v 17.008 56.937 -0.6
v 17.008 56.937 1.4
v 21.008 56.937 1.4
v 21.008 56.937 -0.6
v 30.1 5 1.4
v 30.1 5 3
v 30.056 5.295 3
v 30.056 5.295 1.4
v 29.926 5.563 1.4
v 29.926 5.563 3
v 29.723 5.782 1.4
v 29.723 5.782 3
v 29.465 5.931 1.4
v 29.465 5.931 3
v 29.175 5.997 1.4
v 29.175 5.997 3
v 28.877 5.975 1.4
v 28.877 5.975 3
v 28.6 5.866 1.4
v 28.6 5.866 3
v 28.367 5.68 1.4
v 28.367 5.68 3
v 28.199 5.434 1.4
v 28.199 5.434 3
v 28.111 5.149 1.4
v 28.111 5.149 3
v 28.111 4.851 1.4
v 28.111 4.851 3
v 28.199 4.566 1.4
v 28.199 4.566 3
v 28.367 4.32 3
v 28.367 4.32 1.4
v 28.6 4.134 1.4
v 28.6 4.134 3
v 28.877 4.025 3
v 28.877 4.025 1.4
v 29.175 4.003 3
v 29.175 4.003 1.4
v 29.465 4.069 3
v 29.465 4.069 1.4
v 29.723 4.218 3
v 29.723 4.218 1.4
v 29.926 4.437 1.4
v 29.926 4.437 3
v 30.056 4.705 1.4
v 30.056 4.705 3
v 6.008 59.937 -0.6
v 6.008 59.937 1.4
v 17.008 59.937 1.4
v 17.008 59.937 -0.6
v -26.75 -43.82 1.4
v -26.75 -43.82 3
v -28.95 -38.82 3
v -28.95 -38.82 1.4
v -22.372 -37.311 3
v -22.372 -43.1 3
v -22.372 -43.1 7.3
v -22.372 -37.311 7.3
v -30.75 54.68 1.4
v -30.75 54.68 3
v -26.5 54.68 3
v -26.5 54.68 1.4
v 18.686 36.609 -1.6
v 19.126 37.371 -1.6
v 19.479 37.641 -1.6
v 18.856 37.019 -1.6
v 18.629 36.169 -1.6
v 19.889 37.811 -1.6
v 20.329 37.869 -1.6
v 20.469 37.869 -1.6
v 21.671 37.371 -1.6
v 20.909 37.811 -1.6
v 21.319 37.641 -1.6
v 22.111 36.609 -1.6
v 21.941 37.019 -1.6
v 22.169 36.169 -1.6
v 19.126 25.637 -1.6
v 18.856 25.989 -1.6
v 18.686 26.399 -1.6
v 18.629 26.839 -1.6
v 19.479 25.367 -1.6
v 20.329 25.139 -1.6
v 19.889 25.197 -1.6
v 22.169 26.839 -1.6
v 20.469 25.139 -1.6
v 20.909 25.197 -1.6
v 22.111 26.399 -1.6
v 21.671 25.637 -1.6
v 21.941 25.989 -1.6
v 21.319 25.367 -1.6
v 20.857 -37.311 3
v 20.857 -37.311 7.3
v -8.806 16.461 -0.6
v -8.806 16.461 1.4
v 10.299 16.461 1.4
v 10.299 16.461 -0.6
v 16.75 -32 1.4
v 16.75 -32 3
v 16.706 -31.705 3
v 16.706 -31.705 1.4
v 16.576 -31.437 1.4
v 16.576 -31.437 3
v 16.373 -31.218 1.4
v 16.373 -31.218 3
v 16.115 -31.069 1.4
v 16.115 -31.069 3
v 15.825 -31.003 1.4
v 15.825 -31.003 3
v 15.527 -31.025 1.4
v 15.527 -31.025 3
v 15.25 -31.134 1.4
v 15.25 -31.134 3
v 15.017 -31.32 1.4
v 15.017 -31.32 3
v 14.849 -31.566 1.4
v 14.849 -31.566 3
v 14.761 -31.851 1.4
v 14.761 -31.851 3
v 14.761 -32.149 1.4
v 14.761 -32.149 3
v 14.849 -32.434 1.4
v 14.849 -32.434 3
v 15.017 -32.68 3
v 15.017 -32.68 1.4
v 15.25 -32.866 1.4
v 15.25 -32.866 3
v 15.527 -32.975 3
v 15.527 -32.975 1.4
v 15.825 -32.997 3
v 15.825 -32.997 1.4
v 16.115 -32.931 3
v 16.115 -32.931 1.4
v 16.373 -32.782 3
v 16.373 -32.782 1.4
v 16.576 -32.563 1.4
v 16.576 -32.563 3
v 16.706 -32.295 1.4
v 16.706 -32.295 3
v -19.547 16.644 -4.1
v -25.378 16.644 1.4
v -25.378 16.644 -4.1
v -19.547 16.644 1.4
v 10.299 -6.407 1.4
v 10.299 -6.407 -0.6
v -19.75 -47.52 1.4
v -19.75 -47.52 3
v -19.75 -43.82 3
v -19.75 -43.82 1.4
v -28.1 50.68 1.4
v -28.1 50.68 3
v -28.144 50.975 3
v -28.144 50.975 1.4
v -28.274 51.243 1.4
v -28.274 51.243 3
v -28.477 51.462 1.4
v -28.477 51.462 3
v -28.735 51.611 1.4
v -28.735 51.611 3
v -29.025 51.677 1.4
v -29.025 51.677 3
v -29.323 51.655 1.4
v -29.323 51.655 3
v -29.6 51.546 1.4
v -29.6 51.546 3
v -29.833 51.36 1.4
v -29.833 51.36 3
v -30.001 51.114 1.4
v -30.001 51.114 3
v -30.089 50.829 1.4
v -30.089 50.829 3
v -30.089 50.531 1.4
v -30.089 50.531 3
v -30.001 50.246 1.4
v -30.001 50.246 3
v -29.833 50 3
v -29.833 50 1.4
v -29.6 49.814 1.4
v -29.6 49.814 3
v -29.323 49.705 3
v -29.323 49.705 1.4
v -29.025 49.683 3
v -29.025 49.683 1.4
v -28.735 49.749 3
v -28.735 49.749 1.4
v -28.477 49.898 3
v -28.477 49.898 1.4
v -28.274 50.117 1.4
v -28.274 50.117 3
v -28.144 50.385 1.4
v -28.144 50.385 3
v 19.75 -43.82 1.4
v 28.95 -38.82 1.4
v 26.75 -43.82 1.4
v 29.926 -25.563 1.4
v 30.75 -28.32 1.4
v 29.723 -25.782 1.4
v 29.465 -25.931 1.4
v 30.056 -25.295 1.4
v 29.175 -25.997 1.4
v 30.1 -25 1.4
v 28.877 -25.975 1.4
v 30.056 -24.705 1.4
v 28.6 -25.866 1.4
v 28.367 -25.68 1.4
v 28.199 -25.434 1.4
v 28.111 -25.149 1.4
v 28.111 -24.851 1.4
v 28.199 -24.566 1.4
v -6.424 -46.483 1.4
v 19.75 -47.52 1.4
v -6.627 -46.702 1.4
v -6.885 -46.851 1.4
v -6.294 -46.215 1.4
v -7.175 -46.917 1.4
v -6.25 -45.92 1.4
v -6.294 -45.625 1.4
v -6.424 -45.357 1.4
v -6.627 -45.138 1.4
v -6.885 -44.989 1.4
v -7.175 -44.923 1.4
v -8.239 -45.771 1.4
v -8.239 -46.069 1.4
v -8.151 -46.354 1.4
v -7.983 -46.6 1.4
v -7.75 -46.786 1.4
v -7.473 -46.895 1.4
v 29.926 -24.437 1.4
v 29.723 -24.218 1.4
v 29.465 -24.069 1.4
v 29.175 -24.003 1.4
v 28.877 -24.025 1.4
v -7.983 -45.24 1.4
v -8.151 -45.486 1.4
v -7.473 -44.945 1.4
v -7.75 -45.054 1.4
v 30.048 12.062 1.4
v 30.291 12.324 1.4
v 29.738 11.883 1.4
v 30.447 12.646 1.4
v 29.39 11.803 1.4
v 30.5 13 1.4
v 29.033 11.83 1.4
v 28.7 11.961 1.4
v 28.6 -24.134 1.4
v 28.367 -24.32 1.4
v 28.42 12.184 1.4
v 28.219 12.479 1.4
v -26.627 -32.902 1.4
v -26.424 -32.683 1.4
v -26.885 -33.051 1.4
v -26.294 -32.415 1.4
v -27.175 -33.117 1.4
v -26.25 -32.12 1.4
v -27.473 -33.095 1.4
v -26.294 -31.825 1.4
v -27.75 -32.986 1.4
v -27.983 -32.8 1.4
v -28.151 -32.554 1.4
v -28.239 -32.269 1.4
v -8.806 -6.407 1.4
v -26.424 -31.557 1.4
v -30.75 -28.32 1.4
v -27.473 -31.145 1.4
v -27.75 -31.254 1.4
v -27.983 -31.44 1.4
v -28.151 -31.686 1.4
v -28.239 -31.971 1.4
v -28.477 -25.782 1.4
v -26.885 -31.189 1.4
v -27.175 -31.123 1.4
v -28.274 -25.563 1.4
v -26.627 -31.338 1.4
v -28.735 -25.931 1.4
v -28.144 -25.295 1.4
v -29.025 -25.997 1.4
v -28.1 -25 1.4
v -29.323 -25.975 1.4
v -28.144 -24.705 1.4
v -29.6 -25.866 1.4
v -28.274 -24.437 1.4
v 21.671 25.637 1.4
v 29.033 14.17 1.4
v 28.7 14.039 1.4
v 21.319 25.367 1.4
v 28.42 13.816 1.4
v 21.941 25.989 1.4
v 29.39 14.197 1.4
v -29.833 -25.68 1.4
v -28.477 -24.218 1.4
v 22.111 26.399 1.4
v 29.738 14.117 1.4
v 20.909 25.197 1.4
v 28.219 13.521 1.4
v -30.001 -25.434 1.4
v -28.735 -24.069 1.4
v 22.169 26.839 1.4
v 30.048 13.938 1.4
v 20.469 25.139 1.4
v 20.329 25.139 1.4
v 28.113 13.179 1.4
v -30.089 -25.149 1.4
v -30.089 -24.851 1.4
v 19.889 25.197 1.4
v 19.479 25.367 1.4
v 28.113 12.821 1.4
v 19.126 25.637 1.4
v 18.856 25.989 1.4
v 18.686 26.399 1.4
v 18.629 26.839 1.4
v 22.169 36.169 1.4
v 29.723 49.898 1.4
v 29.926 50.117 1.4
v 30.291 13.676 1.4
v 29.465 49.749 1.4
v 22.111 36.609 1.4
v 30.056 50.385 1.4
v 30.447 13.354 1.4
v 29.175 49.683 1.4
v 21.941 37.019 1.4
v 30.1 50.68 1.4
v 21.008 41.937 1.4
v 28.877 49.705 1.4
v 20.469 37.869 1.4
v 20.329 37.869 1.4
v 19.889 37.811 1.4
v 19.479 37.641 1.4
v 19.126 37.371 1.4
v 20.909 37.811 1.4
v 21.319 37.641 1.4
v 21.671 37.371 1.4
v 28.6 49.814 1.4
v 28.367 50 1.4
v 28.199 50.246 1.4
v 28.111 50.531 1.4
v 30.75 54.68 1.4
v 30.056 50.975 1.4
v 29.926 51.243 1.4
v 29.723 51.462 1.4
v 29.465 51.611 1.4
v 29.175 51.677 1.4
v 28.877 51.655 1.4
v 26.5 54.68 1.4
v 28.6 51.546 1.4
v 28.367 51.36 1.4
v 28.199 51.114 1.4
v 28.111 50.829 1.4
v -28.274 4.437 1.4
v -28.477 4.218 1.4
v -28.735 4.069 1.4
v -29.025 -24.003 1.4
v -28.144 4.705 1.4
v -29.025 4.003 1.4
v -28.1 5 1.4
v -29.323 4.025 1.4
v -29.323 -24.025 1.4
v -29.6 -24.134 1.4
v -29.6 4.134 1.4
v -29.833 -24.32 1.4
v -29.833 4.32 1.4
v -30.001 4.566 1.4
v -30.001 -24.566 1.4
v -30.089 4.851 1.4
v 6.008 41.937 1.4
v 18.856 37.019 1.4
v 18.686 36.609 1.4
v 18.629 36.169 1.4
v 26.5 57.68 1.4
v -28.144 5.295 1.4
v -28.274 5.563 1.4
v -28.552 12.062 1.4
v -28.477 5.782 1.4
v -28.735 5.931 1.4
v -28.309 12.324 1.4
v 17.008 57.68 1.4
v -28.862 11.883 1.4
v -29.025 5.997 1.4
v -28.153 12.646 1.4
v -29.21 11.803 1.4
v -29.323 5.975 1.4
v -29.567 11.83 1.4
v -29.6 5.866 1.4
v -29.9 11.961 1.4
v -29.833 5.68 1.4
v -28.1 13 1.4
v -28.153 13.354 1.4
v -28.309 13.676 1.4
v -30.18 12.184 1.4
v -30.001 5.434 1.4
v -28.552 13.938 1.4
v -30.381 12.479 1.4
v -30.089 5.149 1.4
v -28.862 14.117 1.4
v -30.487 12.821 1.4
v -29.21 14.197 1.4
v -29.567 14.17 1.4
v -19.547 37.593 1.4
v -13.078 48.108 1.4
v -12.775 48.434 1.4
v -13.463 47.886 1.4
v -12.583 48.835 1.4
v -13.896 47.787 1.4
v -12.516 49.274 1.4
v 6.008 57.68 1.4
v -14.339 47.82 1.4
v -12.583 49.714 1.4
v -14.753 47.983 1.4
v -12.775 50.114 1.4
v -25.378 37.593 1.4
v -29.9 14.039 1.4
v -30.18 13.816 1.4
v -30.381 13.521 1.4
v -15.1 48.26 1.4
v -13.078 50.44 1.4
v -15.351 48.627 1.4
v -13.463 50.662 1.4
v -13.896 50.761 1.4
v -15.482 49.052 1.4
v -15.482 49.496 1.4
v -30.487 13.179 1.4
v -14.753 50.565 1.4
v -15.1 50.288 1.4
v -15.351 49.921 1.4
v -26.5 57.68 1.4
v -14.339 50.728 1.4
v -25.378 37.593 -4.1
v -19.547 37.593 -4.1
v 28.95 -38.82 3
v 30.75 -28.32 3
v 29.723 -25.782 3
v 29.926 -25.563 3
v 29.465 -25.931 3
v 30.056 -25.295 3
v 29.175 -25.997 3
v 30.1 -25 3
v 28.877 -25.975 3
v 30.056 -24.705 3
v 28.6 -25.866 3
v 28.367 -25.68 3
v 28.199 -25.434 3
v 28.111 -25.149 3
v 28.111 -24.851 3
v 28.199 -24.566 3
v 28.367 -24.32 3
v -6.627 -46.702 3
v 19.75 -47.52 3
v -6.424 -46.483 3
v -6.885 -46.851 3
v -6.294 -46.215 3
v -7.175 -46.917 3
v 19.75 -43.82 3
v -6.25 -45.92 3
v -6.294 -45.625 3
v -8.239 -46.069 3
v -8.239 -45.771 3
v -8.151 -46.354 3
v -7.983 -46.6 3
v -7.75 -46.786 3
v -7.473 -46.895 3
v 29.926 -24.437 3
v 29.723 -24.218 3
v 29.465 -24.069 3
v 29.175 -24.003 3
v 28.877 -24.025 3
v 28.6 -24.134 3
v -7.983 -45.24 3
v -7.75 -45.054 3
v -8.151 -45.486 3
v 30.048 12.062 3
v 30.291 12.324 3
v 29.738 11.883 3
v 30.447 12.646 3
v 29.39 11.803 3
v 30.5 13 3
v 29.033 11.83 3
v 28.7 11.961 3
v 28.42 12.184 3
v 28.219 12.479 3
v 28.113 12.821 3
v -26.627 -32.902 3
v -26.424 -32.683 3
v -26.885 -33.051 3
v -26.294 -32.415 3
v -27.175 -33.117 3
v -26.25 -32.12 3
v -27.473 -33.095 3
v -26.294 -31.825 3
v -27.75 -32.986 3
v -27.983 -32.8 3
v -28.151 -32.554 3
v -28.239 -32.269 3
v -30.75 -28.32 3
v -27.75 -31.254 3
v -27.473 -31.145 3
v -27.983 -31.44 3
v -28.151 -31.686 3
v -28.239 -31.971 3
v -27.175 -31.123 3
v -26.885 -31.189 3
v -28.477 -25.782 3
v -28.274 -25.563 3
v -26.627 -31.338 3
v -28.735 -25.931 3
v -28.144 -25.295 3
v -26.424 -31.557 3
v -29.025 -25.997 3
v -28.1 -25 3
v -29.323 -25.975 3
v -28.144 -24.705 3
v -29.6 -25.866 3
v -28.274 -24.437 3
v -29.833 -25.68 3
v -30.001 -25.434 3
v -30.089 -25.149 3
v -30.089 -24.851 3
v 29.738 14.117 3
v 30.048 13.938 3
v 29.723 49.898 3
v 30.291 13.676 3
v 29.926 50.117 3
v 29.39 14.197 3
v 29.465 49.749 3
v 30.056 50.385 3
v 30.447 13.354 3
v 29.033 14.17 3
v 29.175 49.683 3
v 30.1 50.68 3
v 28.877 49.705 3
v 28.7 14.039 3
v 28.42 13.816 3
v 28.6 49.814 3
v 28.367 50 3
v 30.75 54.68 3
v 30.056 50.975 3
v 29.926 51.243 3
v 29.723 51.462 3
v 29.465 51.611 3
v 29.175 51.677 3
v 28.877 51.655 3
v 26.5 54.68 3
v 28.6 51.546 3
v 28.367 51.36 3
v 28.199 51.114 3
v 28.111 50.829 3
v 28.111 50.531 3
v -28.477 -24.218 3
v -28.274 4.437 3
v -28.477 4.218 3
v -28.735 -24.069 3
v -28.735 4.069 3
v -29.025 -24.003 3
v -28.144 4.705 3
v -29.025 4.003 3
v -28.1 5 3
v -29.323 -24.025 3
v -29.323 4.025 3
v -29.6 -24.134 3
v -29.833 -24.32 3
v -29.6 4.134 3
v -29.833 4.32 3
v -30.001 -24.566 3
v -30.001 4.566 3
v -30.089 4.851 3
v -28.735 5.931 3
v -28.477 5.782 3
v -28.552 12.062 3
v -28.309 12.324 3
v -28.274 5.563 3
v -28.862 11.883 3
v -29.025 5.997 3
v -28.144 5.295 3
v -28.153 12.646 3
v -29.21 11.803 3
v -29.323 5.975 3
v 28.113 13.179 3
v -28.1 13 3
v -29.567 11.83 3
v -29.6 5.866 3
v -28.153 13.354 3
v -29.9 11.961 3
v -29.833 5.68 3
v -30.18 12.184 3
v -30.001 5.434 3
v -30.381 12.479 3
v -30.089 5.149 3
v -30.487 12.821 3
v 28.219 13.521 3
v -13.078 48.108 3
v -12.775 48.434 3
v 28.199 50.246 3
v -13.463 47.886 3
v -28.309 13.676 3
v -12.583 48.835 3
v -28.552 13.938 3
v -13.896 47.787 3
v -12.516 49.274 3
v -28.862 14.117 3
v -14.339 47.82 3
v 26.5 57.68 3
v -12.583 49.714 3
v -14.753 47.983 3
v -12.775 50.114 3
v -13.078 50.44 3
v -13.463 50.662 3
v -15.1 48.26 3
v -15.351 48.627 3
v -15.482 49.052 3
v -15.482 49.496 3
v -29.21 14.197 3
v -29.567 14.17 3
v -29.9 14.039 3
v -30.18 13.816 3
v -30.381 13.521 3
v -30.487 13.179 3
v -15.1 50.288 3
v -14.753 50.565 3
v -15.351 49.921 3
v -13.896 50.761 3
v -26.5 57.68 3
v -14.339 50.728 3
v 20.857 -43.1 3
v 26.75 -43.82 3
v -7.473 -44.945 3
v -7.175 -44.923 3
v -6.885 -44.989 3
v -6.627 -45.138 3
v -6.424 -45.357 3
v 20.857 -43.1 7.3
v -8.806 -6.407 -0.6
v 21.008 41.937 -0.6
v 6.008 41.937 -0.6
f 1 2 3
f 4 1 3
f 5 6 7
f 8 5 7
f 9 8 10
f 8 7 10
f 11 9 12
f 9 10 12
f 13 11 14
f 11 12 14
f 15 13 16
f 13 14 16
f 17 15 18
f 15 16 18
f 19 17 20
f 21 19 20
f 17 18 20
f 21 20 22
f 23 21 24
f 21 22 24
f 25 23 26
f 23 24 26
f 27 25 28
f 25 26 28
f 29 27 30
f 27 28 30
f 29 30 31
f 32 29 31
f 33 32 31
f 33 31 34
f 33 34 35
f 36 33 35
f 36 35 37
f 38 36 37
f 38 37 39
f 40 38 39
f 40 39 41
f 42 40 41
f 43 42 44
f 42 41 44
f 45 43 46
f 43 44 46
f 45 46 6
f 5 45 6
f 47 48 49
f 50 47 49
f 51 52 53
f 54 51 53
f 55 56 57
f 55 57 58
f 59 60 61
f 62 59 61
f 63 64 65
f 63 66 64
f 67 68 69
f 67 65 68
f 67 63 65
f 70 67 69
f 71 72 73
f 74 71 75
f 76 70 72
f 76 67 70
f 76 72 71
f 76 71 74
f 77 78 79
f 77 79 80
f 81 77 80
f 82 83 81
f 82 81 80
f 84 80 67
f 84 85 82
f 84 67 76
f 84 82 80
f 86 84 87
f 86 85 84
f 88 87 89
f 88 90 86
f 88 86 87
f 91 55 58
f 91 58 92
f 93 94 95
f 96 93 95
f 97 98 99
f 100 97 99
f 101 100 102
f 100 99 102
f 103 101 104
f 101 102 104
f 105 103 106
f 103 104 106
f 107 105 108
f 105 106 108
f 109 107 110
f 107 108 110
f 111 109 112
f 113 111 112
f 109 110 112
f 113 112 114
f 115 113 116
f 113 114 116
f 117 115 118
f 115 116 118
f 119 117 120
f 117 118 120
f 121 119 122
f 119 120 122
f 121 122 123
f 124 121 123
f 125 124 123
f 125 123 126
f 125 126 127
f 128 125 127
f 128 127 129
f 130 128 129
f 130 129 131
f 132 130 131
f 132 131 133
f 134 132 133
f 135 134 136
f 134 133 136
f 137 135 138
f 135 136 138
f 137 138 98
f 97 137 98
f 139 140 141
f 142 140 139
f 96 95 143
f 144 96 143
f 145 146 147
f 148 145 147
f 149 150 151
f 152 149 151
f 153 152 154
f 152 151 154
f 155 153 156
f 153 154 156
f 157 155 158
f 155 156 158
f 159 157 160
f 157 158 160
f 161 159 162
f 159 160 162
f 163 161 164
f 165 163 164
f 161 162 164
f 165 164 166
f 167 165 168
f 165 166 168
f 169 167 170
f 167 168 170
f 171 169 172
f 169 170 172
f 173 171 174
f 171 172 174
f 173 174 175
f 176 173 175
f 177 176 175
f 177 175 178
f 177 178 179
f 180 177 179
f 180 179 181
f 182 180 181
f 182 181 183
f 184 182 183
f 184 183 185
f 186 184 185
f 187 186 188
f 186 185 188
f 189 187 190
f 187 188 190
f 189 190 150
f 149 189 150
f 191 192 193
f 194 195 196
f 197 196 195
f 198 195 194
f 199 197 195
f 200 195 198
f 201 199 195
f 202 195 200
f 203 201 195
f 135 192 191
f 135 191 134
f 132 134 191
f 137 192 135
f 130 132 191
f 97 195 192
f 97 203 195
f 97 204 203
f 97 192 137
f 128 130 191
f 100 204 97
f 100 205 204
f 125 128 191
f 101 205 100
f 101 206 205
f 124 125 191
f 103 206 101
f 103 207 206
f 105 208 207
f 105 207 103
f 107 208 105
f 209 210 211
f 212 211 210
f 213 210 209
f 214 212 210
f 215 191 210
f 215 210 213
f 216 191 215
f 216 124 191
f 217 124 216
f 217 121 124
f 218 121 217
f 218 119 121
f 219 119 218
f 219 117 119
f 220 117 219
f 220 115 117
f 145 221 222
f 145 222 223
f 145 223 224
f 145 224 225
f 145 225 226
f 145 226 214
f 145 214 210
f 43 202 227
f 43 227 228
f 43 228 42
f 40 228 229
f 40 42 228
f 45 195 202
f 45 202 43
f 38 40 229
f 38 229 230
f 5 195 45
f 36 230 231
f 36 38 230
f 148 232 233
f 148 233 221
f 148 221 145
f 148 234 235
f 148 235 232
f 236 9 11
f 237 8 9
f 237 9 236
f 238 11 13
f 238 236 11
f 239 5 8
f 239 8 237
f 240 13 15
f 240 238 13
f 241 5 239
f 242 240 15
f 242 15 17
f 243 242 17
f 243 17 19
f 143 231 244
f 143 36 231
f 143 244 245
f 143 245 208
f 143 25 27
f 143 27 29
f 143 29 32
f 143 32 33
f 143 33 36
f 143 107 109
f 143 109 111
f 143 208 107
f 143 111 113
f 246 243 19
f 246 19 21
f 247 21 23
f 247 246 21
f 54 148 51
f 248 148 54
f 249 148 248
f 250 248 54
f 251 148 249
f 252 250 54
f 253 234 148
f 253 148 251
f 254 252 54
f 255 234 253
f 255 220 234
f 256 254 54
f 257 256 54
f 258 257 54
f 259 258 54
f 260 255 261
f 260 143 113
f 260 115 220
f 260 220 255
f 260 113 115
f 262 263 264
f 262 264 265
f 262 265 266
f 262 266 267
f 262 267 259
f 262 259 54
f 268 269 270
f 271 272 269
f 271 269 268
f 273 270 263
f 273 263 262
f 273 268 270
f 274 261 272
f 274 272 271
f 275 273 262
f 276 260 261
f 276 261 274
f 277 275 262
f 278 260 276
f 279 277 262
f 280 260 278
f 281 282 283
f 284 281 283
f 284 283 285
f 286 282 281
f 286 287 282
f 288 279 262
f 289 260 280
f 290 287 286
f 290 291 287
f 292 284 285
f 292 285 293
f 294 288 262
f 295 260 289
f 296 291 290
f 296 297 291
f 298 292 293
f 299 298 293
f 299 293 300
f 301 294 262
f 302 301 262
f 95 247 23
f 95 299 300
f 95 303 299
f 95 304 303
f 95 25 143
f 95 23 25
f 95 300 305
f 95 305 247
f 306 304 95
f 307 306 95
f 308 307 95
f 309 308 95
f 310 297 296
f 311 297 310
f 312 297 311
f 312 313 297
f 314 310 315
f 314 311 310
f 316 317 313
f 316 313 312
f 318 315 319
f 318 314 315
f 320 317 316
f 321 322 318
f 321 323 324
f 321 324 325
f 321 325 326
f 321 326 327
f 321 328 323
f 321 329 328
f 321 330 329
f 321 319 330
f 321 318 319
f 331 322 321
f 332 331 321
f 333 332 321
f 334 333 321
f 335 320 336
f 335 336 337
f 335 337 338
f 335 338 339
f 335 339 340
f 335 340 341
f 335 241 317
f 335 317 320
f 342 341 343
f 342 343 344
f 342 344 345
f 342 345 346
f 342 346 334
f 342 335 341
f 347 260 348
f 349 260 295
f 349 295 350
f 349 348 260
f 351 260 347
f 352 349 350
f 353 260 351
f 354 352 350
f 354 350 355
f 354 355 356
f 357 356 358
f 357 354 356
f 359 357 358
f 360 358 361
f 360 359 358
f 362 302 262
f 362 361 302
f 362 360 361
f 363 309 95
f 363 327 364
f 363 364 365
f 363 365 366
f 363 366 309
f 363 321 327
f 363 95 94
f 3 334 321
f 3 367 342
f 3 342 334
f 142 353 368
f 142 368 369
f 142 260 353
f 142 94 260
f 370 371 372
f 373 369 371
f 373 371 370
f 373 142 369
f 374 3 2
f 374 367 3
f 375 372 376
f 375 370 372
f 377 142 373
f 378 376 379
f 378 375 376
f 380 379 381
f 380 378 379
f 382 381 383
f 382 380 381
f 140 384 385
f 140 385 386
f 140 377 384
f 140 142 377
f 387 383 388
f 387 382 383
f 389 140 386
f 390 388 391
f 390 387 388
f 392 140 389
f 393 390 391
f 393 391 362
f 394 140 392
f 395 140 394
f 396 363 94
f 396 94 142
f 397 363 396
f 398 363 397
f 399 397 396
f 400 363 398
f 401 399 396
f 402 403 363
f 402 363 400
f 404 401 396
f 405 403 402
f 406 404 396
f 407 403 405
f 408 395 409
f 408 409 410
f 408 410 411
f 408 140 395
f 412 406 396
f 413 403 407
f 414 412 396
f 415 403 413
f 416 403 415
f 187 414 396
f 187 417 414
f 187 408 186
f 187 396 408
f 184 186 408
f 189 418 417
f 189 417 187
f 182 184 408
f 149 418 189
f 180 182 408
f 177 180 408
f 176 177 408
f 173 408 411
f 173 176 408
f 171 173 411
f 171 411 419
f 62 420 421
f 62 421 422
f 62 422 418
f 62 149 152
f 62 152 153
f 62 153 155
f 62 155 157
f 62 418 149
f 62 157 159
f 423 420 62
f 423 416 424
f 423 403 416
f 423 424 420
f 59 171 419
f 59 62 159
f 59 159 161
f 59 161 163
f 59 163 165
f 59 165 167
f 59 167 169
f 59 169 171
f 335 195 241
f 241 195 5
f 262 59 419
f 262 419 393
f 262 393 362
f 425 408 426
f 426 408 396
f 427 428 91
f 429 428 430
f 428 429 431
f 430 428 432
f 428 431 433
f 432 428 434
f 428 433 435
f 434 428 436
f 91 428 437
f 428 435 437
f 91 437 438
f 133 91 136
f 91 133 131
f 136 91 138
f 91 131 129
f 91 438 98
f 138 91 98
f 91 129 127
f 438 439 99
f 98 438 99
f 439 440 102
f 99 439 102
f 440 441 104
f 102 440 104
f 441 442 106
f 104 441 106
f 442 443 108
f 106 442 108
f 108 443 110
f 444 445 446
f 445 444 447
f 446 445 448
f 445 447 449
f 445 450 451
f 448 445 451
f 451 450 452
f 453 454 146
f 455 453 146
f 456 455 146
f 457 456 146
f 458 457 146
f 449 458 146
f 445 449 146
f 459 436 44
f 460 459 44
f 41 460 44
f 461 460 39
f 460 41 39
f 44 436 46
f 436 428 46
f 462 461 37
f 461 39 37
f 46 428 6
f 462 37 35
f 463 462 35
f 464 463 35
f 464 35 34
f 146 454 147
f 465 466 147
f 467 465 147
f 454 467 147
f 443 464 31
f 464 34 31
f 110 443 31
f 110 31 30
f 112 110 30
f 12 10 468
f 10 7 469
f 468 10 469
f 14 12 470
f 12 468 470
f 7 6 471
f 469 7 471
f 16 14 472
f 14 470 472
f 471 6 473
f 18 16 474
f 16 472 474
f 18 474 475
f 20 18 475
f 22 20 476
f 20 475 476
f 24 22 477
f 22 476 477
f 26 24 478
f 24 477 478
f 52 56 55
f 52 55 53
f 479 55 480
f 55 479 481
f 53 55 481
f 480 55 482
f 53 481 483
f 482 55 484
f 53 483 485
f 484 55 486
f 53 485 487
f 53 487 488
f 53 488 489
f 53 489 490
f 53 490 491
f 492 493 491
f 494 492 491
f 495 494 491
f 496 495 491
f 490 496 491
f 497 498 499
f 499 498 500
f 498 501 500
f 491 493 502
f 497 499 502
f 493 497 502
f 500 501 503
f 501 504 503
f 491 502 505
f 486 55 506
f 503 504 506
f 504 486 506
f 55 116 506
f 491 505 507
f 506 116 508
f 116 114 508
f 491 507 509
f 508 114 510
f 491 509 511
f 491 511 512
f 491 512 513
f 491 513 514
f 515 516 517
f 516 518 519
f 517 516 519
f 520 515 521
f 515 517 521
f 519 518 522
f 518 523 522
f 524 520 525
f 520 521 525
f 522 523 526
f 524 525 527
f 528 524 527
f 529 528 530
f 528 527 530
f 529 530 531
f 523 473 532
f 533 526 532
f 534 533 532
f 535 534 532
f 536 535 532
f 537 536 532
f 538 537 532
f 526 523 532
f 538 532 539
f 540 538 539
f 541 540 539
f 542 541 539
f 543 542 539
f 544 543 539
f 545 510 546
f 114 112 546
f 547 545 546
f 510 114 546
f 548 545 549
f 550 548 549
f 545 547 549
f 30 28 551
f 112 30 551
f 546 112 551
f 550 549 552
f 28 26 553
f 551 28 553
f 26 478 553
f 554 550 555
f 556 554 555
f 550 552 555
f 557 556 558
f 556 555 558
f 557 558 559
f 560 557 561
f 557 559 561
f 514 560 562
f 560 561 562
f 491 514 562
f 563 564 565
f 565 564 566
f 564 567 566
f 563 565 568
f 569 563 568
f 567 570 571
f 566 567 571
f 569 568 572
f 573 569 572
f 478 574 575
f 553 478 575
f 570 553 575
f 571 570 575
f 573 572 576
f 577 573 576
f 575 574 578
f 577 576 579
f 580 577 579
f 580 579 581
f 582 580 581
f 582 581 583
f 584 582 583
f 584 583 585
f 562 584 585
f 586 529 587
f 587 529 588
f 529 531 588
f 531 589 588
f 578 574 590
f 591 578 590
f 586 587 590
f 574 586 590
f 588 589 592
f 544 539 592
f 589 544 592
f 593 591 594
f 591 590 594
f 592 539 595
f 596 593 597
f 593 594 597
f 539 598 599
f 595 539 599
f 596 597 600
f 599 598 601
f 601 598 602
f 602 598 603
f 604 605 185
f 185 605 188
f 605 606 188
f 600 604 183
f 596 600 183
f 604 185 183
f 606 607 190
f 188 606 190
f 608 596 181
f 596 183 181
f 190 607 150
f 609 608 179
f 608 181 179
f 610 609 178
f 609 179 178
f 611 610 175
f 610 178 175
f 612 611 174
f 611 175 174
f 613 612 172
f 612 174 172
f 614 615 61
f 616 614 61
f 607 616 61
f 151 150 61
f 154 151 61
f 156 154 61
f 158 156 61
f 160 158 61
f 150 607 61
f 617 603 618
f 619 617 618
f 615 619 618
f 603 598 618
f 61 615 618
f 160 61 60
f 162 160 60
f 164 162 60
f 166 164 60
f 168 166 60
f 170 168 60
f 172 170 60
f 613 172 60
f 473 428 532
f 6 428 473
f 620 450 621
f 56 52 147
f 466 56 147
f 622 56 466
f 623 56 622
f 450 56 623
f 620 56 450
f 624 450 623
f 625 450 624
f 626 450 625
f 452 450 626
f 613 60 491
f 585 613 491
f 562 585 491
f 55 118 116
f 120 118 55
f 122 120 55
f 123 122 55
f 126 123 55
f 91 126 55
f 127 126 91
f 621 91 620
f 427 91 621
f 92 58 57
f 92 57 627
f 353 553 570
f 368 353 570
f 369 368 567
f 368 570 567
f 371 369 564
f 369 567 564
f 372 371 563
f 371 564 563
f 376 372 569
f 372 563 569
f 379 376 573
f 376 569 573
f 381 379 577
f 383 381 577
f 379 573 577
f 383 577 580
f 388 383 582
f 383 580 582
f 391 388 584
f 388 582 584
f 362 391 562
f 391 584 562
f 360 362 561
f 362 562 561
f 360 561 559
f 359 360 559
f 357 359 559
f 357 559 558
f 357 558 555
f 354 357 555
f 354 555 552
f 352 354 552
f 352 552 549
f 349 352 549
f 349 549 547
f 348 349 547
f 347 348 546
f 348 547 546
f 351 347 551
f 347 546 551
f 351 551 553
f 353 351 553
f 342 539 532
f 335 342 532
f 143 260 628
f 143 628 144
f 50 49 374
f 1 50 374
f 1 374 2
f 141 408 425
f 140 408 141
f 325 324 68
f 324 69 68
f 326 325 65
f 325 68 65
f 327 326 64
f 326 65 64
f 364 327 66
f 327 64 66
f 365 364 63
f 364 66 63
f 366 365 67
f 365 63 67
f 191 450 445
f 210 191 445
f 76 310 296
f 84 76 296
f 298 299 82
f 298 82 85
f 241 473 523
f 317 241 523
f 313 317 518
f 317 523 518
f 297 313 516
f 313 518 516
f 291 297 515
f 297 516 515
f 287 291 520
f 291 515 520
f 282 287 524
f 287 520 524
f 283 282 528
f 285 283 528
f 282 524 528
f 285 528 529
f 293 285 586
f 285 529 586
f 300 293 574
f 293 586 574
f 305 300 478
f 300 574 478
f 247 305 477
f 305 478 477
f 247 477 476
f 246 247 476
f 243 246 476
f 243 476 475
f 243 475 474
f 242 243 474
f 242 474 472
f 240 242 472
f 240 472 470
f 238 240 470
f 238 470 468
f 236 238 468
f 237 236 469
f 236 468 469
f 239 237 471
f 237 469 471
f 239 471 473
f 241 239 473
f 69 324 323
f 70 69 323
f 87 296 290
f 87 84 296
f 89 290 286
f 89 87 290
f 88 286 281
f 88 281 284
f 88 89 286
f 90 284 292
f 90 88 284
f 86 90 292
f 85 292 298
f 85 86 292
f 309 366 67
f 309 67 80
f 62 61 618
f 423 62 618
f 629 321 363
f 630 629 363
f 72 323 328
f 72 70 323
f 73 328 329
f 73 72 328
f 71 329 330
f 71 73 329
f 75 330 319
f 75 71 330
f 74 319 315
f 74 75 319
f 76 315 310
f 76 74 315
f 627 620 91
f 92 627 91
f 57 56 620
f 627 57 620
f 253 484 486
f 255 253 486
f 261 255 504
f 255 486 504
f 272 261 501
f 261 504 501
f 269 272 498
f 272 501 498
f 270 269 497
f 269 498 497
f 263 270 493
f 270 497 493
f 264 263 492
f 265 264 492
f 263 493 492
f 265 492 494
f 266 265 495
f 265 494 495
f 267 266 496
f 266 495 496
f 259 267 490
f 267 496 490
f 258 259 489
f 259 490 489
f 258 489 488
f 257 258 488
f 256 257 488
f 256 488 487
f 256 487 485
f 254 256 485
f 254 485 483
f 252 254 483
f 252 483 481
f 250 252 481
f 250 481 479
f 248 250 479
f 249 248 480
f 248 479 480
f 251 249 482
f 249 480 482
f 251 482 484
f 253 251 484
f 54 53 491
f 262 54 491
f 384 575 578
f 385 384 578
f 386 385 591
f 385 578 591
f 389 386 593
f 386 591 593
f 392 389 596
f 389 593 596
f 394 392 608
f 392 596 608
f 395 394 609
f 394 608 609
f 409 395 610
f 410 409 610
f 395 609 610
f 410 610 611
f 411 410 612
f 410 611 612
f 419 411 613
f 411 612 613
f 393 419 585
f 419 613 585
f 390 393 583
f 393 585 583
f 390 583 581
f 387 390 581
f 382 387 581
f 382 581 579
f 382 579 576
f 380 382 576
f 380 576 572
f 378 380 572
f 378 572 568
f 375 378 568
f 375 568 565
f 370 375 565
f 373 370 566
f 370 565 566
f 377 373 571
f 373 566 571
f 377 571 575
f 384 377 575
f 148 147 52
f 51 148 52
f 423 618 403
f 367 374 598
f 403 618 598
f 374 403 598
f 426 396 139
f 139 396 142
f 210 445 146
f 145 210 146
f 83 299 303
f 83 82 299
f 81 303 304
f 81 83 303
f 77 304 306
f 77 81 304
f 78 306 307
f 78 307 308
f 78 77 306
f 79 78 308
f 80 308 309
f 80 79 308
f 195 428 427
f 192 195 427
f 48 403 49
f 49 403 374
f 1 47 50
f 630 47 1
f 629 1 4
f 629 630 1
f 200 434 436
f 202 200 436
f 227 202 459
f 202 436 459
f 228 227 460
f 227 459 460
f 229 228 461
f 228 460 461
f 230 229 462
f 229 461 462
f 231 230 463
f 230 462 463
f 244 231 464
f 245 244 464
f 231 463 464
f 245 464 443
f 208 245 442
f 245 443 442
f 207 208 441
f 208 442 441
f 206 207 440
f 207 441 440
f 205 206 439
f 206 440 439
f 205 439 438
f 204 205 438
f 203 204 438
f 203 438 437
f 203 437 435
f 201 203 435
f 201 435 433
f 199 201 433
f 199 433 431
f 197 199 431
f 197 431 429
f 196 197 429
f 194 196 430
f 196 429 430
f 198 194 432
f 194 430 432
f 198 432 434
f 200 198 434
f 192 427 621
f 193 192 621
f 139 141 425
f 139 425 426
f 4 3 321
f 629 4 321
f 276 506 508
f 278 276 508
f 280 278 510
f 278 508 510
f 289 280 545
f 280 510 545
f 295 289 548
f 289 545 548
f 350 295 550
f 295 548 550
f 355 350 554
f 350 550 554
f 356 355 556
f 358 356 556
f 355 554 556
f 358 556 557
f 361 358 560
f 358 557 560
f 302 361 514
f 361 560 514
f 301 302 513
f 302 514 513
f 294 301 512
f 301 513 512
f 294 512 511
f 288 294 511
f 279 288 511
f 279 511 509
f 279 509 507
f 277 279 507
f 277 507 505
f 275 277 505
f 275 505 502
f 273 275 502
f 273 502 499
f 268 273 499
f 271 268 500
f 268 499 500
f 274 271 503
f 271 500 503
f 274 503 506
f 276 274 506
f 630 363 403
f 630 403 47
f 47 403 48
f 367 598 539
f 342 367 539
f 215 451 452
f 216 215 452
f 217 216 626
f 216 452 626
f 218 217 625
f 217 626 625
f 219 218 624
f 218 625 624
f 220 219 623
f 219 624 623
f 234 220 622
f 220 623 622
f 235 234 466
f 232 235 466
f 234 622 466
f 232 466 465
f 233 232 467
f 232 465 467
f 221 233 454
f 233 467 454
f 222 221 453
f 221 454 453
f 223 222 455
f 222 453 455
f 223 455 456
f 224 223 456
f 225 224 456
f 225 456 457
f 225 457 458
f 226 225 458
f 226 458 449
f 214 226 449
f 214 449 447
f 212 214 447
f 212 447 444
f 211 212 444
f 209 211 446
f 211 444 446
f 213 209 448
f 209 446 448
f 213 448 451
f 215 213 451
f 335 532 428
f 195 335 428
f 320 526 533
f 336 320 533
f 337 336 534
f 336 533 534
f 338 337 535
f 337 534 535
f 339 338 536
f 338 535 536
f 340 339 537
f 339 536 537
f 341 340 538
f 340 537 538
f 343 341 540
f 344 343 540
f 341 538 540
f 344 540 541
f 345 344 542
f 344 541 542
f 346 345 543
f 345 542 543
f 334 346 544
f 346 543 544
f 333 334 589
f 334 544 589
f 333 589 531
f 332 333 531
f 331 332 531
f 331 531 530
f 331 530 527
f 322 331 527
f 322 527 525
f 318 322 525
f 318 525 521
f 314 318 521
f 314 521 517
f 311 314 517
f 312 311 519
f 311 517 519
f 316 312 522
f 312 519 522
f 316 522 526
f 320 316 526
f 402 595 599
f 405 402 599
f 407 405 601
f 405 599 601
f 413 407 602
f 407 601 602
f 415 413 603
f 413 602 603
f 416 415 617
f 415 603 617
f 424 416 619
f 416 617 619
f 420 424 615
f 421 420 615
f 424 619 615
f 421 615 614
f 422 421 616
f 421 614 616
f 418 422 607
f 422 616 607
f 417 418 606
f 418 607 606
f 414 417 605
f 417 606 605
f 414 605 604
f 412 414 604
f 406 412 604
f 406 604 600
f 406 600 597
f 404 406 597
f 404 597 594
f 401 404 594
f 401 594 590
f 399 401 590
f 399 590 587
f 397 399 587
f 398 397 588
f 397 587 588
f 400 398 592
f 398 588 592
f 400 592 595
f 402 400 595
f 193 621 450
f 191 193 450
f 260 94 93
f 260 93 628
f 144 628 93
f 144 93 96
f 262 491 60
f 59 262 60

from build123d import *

# Parameters (mm, degrees)
SKETCH006_R   = 1
SKETCH006_R_2 = 1.2
SKETCH006_R_3 = 1.491082
PAD002_DEPTH  = 1.6
SKETCH033_W   = 5.831177
SKETCH033_H   = 20.949042
PAD019_DEPTH  = 5.5
PAD021_DEPTH  = 2
SKETCH053_W   = 19.104945
SKETCH053_H   = 22.868039
PAD026_DEPTH  = 2
SKETCH058_W   = 43.228985
SKETCH058_H   = 5.789597
PAD028_DEPTH  = 4.3
SKETCH110_W   = 3.54
SKETCH110_H   = 12.73
PAD057_DEPTH  = 3
FILLET018_R   = 1.7


with BuildPart() as part:
    # Sketch006 → Pad002 (new body)
    with BuildSketch(Plane.XY.offset(3)):
        Polygon((30.75, 54.68), (30.75, -28.32), (28.95, -38.82), (26.75, -43.82), (19.75, -43.82), (19.75, -47.52), (-19.75, -47.52), (-19.75, -43.82), (-26.75, -43.82), (-28.95, -38.82), (-30.75, -28.32), (-30.75, 54.68), (-26.5, 54.68), (-26.5, 57.68), (26.5, 57.68), (26.5, 54.68), align=None)
        with Locations((-27.25, -32.12)):
            Circle(SKETCH006_R, mode=Mode.SUBTRACT)
        with Locations((15.75, -32)):
            Circle(SKETCH006_R, mode=Mode.SUBTRACT)
        with Locations((29.1, 50.68)):
            Circle(SKETCH006_R, mode=Mode.SUBTRACT)
        with Locations((-29.1, 50.68)):
            Circle(SKETCH006_R, mode=Mode.SUBTRACT)
        with Locations((-29.1, 5)):
            Circle(SKETCH006_R, mode=Mode.SUBTRACT)
        with Locations((-29.3, 13)):
            Circle(SKETCH006_R_2, mode=Mode.SUBTRACT)
        with Locations((29.3, 13)):
            Circle(SKETCH006_R_2, mode=Mode.SUBTRACT)
        with Locations((29.1, 5)):
            Circle(SKETCH006_R, mode=Mode.SUBTRACT)
        with Locations((-7.25, -45.92)):
            Circle(SKETCH006_R, mode=Mode.SUBTRACT)
        with Locations((-29.1, -25)):
            Circle(SKETCH006_R, mode=Mode.SUBTRACT)
        with Locations((29.1, -25)):
            Circle(SKETCH006_R, mode=Mode.SUBTRACT)
        with Locations((-14.007447, 49.274082)):
            Circle(SKETCH006_R_3, mode=Mode.SUBTRACT)
    extrude(amount=-PAD002_DEPTH)

    # Sketch033 (on Face30 of Pad002) → Pad019 (join)
    with BuildSketch(Plane(origin=(0, 0, 1.4), x_dir=(1, 0, 0), z_dir=(0, 0, -1))):
        with Locations((-22.462421, -27.118268)):
            Rectangle(SKETCH033_W, SKETCH033_H)
    extrude(amount=PAD019_DEPTH)

    # Sketch046 (on Face5 of Pad019) → Pad021 (join)
    with BuildSketch(Plane(origin=(0, 0, 1.4), x_dir=(1, 0, 0), z_dir=(0, 0, -1))):
        Polygon((21.00816, -56.937296), (21.00816, -41.937296), (6.00816, -41.937296), (6.00816, -56.937296), (6.00816, -59.937296), (17.00816, -59.937296), (17.00816, -56.937296), align=None)
    extrude(amount=PAD021_DEPTH)

    # Sketch053 (on Face5 of Pad021) → Pad026 (join)
    with BuildSketch(Plane(origin=(0, 0, 1.4), x_dir=(1, 0, 0), z_dir=(0, 0, -1))):
        with Locations((0.746086, -5.026741)):
            Rectangle(SKETCH053_W, SKETCH053_H)
    extrude(amount=PAD026_DEPTH)

    # Sketch058 (on Face4 of Pad026) → Pad028 (join)
    with BuildSketch(Plane.XY.offset(3)):
        with Locations((-0.757428, -40.205624)):
            Rectangle(SKETCH058_W, SKETCH058_H)
    extrude(amount=PAD028_DEPTH)

    # Sketch110 (on Face5 of Pad028) → Pad057 (join)
    with BuildSketch(Plane(origin=(0, 0, 1.4), x_dir=(1, 0, 0), z_dir=(0, 0, -1))):
        with Locations((20.398529, -31.503779)):
            Rectangle(SKETCH110_W, SKETCH110_H)
    extrude(amount=PAD057_DEPTH)

    # Fillet018
    fillet018_edges = [part.edges().sort_by_distance(p)[0] for p in [
        (18.628529, 25.138779, -0.1),
        (22.168529, 25.138779, -0.1),
        (22.168529, 37.868779, -0.1),
        (18.628529, 37.868779, -0.1),
    ]]
    fillet(fillet018_edges, radius=FILLET018_R)


solid = part.part
